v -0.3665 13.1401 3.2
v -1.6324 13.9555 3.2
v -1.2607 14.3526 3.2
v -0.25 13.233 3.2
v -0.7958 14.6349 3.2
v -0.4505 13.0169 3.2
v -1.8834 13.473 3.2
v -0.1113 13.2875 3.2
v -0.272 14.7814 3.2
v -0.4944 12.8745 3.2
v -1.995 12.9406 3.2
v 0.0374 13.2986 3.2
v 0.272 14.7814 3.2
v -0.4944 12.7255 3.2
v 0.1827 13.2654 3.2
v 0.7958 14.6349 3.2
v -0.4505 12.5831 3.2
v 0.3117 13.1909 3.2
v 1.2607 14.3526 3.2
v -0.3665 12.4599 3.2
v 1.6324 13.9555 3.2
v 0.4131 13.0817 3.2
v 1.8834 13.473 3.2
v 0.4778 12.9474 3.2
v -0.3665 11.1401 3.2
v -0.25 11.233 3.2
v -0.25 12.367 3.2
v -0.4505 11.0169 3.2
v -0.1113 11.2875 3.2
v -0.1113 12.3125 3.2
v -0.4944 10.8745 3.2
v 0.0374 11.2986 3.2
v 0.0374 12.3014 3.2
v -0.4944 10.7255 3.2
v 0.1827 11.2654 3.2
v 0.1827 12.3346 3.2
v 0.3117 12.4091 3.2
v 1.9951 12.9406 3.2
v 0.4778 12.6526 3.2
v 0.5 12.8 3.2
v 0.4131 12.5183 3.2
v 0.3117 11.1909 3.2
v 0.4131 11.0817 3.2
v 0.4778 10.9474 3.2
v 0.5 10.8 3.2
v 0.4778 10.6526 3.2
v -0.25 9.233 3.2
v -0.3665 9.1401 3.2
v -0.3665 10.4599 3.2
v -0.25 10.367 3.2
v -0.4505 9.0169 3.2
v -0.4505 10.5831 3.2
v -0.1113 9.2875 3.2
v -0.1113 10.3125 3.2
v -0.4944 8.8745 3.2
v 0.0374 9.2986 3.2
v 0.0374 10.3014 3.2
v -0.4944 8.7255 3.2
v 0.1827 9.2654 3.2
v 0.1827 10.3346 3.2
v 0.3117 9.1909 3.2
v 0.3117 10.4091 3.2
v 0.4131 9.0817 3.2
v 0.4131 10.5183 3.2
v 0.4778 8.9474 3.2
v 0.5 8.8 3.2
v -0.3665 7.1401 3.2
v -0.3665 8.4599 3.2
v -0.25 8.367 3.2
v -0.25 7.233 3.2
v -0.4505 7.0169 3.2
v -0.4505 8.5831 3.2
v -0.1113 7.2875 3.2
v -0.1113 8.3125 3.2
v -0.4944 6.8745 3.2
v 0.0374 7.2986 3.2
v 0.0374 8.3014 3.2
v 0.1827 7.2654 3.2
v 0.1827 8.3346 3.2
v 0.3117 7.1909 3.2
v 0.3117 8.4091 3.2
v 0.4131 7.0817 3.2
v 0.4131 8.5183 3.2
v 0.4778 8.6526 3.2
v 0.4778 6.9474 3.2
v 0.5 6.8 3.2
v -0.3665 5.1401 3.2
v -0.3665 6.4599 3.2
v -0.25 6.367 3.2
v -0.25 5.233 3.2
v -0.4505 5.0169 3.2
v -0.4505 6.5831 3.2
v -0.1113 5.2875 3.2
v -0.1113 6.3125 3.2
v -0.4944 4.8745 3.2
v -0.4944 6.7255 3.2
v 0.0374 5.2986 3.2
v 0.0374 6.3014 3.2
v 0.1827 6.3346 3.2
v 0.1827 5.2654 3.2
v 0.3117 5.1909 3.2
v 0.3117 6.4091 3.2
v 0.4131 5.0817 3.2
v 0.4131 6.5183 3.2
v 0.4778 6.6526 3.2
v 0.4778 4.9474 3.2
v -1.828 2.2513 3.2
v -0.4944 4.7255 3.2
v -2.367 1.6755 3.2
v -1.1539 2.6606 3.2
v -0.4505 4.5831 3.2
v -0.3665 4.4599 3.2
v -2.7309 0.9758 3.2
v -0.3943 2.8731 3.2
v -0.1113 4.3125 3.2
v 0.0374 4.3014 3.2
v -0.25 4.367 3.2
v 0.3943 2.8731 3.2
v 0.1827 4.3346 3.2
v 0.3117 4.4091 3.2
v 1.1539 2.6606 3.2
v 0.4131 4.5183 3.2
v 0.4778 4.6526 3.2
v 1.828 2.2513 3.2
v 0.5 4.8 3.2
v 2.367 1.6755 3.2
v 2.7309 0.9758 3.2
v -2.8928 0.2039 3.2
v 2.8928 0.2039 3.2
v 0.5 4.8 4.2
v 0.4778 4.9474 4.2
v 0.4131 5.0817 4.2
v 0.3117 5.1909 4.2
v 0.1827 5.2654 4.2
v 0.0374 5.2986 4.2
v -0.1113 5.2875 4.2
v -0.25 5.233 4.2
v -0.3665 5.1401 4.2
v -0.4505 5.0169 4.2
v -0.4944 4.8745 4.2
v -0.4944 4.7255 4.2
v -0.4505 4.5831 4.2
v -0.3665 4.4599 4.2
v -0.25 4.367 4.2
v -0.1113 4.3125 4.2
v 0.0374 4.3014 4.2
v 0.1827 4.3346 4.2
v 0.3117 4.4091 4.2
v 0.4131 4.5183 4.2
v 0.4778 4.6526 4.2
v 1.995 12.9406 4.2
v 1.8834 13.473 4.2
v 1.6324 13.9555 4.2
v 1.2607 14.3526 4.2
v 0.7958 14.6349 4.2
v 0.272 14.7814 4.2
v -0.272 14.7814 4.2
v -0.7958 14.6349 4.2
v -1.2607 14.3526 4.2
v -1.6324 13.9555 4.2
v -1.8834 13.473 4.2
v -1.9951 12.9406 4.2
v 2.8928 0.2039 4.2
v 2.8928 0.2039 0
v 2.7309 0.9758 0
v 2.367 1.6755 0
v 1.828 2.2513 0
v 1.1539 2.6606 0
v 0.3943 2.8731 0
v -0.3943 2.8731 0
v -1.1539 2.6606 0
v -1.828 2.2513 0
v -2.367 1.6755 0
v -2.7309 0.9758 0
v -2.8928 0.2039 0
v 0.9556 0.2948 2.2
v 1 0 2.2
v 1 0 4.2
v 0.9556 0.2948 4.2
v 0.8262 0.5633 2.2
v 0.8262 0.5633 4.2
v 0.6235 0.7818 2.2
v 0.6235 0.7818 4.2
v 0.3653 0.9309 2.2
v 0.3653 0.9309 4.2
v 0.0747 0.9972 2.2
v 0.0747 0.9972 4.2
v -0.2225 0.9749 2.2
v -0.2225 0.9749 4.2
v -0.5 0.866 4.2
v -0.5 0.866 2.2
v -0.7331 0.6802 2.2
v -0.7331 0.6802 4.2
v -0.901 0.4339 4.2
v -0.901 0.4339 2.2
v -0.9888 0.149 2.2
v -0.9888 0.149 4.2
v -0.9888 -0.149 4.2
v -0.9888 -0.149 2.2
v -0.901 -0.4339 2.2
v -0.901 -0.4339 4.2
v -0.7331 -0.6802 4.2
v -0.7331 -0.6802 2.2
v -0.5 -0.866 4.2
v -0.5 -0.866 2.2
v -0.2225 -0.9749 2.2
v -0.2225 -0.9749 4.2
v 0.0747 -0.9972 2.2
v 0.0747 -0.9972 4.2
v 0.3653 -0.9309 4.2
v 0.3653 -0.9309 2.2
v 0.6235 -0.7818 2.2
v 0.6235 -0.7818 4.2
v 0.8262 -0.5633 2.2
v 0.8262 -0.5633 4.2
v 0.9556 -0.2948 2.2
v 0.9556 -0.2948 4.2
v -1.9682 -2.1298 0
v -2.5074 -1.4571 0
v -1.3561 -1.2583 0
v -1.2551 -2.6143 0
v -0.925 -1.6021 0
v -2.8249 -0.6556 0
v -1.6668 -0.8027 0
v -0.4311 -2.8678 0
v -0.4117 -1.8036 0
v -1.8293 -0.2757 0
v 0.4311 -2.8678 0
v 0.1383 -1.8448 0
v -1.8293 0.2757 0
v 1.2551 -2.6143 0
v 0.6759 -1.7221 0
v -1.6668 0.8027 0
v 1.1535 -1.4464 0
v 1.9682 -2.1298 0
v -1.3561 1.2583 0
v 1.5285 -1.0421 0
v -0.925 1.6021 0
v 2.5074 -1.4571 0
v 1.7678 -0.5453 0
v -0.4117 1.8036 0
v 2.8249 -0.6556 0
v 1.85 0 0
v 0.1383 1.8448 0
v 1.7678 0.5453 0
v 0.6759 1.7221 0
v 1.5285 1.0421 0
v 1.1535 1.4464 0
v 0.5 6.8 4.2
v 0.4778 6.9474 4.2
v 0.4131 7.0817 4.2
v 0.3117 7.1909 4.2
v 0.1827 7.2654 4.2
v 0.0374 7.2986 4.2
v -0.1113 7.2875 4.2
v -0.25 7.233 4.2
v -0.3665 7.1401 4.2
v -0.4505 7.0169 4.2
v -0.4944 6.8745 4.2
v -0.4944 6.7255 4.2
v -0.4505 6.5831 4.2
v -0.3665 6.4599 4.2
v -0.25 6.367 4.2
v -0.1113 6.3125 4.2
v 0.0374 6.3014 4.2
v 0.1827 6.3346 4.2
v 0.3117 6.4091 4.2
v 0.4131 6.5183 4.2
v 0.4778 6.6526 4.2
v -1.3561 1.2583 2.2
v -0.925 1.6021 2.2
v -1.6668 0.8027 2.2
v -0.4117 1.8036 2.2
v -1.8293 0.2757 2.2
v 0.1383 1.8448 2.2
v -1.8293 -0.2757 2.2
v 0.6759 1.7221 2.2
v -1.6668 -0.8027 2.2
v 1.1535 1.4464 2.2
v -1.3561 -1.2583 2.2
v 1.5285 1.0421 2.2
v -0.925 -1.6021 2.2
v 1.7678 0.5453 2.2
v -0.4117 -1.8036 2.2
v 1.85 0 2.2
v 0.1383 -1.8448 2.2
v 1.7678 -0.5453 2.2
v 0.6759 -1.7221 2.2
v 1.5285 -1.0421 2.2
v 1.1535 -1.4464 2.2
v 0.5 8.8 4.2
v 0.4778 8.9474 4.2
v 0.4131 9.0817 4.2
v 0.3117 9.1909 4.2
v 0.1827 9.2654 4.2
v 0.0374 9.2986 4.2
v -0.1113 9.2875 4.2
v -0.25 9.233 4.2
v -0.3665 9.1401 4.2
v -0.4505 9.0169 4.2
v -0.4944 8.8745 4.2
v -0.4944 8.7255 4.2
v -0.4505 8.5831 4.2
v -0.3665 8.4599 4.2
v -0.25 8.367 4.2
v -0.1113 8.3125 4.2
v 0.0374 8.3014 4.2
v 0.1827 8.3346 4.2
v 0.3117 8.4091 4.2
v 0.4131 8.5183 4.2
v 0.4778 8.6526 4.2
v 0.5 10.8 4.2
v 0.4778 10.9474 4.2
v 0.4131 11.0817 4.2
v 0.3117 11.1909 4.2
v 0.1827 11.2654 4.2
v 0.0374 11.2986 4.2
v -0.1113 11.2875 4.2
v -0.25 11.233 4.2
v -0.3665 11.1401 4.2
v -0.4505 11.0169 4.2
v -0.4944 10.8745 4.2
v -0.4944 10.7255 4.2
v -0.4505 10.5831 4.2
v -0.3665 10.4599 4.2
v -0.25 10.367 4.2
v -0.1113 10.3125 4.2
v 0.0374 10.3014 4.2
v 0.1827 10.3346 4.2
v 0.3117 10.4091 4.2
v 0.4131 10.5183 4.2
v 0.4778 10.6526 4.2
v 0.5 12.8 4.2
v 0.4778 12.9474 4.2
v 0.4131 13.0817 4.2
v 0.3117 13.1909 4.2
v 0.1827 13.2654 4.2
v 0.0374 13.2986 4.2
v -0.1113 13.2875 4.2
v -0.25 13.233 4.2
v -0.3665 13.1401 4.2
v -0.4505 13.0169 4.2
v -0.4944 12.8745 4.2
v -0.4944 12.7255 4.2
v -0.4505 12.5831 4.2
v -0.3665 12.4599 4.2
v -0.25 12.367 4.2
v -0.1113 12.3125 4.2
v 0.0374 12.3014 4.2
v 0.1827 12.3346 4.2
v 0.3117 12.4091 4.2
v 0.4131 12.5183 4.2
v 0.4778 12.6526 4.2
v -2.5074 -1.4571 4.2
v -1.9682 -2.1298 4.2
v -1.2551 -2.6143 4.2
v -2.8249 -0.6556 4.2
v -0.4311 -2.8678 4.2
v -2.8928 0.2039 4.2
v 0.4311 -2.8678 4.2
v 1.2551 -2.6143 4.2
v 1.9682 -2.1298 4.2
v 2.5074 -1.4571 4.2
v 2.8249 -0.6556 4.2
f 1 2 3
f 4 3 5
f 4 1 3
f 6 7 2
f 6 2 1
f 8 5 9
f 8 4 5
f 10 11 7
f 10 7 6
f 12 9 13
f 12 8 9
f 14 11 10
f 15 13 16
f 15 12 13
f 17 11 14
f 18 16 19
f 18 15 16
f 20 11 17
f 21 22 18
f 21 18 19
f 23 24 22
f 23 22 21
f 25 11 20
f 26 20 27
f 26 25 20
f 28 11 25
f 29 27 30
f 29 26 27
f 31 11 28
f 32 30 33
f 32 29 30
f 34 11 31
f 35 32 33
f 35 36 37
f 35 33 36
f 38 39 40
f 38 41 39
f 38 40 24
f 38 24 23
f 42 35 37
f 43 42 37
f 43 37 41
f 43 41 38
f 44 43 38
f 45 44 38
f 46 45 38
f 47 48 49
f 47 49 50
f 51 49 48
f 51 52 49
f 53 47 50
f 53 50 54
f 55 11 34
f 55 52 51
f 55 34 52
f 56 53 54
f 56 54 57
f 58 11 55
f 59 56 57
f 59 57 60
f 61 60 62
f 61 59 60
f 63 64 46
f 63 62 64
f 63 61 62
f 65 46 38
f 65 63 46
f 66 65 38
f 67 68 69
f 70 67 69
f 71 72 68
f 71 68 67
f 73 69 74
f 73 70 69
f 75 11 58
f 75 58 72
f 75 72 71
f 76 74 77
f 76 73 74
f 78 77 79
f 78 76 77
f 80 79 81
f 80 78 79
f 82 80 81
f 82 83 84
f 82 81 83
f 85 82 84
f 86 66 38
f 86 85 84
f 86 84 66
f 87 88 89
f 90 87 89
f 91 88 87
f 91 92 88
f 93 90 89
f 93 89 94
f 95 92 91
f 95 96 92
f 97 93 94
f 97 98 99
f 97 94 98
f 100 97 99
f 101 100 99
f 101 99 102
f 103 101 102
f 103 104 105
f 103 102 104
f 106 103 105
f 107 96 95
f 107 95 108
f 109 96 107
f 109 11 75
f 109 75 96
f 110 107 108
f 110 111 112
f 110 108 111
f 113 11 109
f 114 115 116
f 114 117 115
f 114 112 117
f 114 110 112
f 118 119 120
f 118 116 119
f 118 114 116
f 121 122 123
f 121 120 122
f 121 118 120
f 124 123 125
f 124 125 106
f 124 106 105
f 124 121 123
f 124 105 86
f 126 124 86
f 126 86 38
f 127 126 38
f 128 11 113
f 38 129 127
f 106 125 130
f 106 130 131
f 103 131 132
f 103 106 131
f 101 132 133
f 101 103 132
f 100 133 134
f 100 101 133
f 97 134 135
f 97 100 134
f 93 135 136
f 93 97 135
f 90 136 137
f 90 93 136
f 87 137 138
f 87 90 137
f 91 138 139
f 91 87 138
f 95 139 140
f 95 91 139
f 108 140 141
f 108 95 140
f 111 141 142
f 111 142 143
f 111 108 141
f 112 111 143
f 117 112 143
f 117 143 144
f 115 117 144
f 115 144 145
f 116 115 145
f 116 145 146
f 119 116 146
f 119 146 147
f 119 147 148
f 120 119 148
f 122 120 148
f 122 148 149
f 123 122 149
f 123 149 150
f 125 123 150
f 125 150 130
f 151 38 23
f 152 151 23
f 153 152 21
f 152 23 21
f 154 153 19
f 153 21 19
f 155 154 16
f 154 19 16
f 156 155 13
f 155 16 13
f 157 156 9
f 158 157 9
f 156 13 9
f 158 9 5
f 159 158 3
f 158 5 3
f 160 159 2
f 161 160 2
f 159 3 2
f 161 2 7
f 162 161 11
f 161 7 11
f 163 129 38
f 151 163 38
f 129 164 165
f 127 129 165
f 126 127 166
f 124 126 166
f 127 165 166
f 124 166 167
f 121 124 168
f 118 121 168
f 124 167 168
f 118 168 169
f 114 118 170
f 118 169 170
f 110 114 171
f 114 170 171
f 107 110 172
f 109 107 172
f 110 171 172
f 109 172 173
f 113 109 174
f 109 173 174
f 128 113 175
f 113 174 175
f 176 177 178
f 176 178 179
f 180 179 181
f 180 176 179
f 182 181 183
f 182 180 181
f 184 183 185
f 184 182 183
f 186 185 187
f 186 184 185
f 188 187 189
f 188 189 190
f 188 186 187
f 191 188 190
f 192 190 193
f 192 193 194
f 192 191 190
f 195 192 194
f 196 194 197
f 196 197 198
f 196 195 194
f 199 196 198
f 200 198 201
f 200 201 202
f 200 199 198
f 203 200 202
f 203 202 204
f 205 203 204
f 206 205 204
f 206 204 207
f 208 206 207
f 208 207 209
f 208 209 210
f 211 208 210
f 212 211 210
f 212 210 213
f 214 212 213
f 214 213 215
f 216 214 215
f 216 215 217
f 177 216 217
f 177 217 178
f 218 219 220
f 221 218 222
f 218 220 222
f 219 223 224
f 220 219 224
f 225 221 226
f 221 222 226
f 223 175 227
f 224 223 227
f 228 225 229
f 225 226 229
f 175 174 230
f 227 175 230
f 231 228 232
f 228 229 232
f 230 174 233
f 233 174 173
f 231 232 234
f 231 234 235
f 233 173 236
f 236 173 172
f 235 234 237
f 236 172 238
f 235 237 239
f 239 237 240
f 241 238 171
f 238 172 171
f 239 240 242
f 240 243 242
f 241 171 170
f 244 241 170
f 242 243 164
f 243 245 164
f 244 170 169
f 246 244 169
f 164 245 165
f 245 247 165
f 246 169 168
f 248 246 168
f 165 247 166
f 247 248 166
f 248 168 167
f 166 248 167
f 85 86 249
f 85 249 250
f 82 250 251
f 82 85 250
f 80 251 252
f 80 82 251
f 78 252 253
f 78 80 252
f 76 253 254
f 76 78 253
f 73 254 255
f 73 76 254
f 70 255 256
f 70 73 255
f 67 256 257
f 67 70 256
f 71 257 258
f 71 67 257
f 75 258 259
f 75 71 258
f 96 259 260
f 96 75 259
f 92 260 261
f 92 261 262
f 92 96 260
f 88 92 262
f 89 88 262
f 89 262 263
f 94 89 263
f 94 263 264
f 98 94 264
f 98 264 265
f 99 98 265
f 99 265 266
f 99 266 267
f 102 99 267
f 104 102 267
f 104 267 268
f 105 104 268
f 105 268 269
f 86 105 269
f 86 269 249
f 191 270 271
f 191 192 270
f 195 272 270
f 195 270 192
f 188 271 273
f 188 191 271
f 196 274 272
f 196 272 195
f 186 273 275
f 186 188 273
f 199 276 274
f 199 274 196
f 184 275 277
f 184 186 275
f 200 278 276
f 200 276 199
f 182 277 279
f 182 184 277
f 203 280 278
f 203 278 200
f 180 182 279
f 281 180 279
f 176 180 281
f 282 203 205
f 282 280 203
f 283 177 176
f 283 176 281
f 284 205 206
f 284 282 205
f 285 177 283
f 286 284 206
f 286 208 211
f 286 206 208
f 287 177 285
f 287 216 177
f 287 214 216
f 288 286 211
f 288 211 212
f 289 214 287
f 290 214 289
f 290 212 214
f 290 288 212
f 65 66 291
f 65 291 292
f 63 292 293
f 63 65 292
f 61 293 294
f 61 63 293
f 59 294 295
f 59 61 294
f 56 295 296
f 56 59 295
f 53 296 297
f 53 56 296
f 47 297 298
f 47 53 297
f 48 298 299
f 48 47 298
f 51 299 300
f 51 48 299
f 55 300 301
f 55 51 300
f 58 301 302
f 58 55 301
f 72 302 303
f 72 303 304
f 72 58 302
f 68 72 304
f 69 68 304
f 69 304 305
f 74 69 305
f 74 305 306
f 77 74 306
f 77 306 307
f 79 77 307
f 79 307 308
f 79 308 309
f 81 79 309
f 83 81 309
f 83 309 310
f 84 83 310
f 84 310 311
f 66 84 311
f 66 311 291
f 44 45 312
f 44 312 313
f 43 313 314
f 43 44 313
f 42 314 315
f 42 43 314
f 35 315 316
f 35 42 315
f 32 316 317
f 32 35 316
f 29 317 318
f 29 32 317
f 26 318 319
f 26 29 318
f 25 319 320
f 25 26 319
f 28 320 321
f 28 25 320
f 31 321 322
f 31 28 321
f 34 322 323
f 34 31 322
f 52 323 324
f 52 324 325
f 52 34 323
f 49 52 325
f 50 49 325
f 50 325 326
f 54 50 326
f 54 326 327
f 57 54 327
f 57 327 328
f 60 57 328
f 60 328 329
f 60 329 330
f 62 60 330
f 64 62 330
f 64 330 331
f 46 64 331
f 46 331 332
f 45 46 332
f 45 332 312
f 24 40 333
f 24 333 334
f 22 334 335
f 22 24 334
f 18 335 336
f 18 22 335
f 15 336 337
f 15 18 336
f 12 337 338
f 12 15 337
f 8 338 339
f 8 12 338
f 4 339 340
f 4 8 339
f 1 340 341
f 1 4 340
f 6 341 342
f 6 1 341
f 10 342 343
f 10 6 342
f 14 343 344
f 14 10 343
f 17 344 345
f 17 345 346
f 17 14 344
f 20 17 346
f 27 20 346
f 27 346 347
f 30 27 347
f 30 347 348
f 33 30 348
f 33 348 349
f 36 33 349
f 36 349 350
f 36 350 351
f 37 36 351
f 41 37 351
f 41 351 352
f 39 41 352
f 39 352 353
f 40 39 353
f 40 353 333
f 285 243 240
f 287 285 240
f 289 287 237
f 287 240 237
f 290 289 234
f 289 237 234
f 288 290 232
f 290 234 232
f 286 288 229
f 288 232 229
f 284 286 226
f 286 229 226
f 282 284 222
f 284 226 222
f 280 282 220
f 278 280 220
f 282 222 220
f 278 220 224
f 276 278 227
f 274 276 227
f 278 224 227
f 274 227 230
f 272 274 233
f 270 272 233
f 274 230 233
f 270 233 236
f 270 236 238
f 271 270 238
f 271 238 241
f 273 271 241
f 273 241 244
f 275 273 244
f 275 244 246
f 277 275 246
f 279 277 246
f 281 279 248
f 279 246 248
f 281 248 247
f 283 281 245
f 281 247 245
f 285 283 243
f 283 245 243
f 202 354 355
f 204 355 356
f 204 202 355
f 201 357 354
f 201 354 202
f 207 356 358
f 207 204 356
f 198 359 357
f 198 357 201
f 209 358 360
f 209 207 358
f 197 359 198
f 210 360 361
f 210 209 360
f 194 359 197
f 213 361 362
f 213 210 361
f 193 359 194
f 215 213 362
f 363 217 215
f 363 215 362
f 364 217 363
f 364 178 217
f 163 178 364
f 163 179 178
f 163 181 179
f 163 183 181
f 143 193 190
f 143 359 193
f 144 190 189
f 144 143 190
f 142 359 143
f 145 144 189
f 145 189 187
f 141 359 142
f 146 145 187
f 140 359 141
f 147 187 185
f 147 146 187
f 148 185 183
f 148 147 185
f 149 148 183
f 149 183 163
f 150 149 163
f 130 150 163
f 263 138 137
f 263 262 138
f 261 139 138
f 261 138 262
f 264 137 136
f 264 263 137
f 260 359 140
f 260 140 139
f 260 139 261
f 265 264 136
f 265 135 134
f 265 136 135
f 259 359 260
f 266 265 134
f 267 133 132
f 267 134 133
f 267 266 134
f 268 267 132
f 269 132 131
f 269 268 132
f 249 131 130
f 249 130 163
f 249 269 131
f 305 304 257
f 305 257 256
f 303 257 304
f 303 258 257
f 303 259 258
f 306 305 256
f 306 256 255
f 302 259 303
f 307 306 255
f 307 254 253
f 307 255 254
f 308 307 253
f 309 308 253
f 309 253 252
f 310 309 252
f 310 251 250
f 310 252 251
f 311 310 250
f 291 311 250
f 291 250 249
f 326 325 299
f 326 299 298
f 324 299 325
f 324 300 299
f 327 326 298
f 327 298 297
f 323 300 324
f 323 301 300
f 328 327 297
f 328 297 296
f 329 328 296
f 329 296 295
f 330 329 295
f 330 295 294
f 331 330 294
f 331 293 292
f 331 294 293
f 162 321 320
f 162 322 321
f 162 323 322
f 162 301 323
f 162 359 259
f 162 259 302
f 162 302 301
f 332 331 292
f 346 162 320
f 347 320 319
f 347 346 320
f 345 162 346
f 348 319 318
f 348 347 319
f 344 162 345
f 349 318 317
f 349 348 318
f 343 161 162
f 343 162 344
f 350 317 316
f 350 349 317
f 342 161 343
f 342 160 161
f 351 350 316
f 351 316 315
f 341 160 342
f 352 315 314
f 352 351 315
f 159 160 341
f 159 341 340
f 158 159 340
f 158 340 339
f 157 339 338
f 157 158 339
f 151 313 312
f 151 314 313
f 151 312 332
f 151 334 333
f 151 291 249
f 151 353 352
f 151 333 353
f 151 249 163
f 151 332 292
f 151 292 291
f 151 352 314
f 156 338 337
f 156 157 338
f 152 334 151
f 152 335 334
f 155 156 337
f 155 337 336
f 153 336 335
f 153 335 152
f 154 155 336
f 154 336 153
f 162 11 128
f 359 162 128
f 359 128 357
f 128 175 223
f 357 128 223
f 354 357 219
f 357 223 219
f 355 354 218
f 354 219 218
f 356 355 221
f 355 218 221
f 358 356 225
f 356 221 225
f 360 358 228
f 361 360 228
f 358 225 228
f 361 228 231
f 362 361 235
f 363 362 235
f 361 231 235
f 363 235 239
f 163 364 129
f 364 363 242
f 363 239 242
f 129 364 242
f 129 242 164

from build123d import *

# Parameters (mm, degrees)
F0_R     = 1
F0_R_2   = 0.5
F1_DEPTH = 4.2
F3_DEPTH = 3.2
F4_R     = 1.85
F4_R_2   = 1
F5_DEPTH = 2.2


with BuildPart() as f1:
    # F0 (on Top) → F1 (new body)
    with BuildSketch(Plane.XY):
        with BuildLine():
            Line((-1.99505, 12.940625), (-2.892823, 0.203906))
            ThreePointArc((-2.892823, 0.203906), (0, -2.9), (2.892823, 0.203906))
            Line((2.892823, 0.203906), (1.99505, 12.940625))
            ThreePointArc((1.99505, 12.940625), (0, 14.8), (-1.99505, 12.940625))
        make_face()
        Circle(F0_R, mode=Mode.SUBTRACT)
        with Locations((0, 4.8)):
            Circle(F0_R_2, mode=Mode.SUBTRACT)
        with Locations((0, 6.8)):
            Circle(F0_R_2, mode=Mode.SUBTRACT)
        with Locations((0, 8.8)):
            Circle(F0_R_2, mode=Mode.SUBTRACT)
        with Locations((0, 10.8)):
            Circle(F0_R_2, mode=Mode.SUBTRACT)
        with Locations((0, 12.8)):
            Circle(F0_R_2, mode=Mode.SUBTRACT)
    extrude(amount=F1_DEPTH)

    # F2 (on face) → F3 (cut)
    with BuildSketch(Plane(origin=(0, 0, 0), x_dir=(1, 0, 0), z_dir=(0, 0, -1))):
        with BuildLine():
            ThreePointArc((2.892823, -0.203906), (0, -2.9), (-2.892823, -0.203906))
            Line((-2.892823, -0.203906), (-1.99505, -12.940625))
            ThreePointArc((-1.99505, -12.940625), (0, -14.8), (1.99505, -12.940625))
            Line((1.99505, -12.940625), (2.892823, -0.203906))
        make_face()
    extrude(amount=-F3_DEPTH, mode=Mode.SUBTRACT)

    # F4 (on face) → F5 (cut)
    with BuildSketch(Plane(origin=(0, 0, 0), x_dir=(1, 0, 0), z_dir=(0, 0, -1))):
        Circle(F4_R)
        Circle(F4_R_2, mode=Mode.SUBTRACT)
    extrude(amount=-F5_DEPTH, mode=Mode.SUBTRACT)


solid = f1.part
